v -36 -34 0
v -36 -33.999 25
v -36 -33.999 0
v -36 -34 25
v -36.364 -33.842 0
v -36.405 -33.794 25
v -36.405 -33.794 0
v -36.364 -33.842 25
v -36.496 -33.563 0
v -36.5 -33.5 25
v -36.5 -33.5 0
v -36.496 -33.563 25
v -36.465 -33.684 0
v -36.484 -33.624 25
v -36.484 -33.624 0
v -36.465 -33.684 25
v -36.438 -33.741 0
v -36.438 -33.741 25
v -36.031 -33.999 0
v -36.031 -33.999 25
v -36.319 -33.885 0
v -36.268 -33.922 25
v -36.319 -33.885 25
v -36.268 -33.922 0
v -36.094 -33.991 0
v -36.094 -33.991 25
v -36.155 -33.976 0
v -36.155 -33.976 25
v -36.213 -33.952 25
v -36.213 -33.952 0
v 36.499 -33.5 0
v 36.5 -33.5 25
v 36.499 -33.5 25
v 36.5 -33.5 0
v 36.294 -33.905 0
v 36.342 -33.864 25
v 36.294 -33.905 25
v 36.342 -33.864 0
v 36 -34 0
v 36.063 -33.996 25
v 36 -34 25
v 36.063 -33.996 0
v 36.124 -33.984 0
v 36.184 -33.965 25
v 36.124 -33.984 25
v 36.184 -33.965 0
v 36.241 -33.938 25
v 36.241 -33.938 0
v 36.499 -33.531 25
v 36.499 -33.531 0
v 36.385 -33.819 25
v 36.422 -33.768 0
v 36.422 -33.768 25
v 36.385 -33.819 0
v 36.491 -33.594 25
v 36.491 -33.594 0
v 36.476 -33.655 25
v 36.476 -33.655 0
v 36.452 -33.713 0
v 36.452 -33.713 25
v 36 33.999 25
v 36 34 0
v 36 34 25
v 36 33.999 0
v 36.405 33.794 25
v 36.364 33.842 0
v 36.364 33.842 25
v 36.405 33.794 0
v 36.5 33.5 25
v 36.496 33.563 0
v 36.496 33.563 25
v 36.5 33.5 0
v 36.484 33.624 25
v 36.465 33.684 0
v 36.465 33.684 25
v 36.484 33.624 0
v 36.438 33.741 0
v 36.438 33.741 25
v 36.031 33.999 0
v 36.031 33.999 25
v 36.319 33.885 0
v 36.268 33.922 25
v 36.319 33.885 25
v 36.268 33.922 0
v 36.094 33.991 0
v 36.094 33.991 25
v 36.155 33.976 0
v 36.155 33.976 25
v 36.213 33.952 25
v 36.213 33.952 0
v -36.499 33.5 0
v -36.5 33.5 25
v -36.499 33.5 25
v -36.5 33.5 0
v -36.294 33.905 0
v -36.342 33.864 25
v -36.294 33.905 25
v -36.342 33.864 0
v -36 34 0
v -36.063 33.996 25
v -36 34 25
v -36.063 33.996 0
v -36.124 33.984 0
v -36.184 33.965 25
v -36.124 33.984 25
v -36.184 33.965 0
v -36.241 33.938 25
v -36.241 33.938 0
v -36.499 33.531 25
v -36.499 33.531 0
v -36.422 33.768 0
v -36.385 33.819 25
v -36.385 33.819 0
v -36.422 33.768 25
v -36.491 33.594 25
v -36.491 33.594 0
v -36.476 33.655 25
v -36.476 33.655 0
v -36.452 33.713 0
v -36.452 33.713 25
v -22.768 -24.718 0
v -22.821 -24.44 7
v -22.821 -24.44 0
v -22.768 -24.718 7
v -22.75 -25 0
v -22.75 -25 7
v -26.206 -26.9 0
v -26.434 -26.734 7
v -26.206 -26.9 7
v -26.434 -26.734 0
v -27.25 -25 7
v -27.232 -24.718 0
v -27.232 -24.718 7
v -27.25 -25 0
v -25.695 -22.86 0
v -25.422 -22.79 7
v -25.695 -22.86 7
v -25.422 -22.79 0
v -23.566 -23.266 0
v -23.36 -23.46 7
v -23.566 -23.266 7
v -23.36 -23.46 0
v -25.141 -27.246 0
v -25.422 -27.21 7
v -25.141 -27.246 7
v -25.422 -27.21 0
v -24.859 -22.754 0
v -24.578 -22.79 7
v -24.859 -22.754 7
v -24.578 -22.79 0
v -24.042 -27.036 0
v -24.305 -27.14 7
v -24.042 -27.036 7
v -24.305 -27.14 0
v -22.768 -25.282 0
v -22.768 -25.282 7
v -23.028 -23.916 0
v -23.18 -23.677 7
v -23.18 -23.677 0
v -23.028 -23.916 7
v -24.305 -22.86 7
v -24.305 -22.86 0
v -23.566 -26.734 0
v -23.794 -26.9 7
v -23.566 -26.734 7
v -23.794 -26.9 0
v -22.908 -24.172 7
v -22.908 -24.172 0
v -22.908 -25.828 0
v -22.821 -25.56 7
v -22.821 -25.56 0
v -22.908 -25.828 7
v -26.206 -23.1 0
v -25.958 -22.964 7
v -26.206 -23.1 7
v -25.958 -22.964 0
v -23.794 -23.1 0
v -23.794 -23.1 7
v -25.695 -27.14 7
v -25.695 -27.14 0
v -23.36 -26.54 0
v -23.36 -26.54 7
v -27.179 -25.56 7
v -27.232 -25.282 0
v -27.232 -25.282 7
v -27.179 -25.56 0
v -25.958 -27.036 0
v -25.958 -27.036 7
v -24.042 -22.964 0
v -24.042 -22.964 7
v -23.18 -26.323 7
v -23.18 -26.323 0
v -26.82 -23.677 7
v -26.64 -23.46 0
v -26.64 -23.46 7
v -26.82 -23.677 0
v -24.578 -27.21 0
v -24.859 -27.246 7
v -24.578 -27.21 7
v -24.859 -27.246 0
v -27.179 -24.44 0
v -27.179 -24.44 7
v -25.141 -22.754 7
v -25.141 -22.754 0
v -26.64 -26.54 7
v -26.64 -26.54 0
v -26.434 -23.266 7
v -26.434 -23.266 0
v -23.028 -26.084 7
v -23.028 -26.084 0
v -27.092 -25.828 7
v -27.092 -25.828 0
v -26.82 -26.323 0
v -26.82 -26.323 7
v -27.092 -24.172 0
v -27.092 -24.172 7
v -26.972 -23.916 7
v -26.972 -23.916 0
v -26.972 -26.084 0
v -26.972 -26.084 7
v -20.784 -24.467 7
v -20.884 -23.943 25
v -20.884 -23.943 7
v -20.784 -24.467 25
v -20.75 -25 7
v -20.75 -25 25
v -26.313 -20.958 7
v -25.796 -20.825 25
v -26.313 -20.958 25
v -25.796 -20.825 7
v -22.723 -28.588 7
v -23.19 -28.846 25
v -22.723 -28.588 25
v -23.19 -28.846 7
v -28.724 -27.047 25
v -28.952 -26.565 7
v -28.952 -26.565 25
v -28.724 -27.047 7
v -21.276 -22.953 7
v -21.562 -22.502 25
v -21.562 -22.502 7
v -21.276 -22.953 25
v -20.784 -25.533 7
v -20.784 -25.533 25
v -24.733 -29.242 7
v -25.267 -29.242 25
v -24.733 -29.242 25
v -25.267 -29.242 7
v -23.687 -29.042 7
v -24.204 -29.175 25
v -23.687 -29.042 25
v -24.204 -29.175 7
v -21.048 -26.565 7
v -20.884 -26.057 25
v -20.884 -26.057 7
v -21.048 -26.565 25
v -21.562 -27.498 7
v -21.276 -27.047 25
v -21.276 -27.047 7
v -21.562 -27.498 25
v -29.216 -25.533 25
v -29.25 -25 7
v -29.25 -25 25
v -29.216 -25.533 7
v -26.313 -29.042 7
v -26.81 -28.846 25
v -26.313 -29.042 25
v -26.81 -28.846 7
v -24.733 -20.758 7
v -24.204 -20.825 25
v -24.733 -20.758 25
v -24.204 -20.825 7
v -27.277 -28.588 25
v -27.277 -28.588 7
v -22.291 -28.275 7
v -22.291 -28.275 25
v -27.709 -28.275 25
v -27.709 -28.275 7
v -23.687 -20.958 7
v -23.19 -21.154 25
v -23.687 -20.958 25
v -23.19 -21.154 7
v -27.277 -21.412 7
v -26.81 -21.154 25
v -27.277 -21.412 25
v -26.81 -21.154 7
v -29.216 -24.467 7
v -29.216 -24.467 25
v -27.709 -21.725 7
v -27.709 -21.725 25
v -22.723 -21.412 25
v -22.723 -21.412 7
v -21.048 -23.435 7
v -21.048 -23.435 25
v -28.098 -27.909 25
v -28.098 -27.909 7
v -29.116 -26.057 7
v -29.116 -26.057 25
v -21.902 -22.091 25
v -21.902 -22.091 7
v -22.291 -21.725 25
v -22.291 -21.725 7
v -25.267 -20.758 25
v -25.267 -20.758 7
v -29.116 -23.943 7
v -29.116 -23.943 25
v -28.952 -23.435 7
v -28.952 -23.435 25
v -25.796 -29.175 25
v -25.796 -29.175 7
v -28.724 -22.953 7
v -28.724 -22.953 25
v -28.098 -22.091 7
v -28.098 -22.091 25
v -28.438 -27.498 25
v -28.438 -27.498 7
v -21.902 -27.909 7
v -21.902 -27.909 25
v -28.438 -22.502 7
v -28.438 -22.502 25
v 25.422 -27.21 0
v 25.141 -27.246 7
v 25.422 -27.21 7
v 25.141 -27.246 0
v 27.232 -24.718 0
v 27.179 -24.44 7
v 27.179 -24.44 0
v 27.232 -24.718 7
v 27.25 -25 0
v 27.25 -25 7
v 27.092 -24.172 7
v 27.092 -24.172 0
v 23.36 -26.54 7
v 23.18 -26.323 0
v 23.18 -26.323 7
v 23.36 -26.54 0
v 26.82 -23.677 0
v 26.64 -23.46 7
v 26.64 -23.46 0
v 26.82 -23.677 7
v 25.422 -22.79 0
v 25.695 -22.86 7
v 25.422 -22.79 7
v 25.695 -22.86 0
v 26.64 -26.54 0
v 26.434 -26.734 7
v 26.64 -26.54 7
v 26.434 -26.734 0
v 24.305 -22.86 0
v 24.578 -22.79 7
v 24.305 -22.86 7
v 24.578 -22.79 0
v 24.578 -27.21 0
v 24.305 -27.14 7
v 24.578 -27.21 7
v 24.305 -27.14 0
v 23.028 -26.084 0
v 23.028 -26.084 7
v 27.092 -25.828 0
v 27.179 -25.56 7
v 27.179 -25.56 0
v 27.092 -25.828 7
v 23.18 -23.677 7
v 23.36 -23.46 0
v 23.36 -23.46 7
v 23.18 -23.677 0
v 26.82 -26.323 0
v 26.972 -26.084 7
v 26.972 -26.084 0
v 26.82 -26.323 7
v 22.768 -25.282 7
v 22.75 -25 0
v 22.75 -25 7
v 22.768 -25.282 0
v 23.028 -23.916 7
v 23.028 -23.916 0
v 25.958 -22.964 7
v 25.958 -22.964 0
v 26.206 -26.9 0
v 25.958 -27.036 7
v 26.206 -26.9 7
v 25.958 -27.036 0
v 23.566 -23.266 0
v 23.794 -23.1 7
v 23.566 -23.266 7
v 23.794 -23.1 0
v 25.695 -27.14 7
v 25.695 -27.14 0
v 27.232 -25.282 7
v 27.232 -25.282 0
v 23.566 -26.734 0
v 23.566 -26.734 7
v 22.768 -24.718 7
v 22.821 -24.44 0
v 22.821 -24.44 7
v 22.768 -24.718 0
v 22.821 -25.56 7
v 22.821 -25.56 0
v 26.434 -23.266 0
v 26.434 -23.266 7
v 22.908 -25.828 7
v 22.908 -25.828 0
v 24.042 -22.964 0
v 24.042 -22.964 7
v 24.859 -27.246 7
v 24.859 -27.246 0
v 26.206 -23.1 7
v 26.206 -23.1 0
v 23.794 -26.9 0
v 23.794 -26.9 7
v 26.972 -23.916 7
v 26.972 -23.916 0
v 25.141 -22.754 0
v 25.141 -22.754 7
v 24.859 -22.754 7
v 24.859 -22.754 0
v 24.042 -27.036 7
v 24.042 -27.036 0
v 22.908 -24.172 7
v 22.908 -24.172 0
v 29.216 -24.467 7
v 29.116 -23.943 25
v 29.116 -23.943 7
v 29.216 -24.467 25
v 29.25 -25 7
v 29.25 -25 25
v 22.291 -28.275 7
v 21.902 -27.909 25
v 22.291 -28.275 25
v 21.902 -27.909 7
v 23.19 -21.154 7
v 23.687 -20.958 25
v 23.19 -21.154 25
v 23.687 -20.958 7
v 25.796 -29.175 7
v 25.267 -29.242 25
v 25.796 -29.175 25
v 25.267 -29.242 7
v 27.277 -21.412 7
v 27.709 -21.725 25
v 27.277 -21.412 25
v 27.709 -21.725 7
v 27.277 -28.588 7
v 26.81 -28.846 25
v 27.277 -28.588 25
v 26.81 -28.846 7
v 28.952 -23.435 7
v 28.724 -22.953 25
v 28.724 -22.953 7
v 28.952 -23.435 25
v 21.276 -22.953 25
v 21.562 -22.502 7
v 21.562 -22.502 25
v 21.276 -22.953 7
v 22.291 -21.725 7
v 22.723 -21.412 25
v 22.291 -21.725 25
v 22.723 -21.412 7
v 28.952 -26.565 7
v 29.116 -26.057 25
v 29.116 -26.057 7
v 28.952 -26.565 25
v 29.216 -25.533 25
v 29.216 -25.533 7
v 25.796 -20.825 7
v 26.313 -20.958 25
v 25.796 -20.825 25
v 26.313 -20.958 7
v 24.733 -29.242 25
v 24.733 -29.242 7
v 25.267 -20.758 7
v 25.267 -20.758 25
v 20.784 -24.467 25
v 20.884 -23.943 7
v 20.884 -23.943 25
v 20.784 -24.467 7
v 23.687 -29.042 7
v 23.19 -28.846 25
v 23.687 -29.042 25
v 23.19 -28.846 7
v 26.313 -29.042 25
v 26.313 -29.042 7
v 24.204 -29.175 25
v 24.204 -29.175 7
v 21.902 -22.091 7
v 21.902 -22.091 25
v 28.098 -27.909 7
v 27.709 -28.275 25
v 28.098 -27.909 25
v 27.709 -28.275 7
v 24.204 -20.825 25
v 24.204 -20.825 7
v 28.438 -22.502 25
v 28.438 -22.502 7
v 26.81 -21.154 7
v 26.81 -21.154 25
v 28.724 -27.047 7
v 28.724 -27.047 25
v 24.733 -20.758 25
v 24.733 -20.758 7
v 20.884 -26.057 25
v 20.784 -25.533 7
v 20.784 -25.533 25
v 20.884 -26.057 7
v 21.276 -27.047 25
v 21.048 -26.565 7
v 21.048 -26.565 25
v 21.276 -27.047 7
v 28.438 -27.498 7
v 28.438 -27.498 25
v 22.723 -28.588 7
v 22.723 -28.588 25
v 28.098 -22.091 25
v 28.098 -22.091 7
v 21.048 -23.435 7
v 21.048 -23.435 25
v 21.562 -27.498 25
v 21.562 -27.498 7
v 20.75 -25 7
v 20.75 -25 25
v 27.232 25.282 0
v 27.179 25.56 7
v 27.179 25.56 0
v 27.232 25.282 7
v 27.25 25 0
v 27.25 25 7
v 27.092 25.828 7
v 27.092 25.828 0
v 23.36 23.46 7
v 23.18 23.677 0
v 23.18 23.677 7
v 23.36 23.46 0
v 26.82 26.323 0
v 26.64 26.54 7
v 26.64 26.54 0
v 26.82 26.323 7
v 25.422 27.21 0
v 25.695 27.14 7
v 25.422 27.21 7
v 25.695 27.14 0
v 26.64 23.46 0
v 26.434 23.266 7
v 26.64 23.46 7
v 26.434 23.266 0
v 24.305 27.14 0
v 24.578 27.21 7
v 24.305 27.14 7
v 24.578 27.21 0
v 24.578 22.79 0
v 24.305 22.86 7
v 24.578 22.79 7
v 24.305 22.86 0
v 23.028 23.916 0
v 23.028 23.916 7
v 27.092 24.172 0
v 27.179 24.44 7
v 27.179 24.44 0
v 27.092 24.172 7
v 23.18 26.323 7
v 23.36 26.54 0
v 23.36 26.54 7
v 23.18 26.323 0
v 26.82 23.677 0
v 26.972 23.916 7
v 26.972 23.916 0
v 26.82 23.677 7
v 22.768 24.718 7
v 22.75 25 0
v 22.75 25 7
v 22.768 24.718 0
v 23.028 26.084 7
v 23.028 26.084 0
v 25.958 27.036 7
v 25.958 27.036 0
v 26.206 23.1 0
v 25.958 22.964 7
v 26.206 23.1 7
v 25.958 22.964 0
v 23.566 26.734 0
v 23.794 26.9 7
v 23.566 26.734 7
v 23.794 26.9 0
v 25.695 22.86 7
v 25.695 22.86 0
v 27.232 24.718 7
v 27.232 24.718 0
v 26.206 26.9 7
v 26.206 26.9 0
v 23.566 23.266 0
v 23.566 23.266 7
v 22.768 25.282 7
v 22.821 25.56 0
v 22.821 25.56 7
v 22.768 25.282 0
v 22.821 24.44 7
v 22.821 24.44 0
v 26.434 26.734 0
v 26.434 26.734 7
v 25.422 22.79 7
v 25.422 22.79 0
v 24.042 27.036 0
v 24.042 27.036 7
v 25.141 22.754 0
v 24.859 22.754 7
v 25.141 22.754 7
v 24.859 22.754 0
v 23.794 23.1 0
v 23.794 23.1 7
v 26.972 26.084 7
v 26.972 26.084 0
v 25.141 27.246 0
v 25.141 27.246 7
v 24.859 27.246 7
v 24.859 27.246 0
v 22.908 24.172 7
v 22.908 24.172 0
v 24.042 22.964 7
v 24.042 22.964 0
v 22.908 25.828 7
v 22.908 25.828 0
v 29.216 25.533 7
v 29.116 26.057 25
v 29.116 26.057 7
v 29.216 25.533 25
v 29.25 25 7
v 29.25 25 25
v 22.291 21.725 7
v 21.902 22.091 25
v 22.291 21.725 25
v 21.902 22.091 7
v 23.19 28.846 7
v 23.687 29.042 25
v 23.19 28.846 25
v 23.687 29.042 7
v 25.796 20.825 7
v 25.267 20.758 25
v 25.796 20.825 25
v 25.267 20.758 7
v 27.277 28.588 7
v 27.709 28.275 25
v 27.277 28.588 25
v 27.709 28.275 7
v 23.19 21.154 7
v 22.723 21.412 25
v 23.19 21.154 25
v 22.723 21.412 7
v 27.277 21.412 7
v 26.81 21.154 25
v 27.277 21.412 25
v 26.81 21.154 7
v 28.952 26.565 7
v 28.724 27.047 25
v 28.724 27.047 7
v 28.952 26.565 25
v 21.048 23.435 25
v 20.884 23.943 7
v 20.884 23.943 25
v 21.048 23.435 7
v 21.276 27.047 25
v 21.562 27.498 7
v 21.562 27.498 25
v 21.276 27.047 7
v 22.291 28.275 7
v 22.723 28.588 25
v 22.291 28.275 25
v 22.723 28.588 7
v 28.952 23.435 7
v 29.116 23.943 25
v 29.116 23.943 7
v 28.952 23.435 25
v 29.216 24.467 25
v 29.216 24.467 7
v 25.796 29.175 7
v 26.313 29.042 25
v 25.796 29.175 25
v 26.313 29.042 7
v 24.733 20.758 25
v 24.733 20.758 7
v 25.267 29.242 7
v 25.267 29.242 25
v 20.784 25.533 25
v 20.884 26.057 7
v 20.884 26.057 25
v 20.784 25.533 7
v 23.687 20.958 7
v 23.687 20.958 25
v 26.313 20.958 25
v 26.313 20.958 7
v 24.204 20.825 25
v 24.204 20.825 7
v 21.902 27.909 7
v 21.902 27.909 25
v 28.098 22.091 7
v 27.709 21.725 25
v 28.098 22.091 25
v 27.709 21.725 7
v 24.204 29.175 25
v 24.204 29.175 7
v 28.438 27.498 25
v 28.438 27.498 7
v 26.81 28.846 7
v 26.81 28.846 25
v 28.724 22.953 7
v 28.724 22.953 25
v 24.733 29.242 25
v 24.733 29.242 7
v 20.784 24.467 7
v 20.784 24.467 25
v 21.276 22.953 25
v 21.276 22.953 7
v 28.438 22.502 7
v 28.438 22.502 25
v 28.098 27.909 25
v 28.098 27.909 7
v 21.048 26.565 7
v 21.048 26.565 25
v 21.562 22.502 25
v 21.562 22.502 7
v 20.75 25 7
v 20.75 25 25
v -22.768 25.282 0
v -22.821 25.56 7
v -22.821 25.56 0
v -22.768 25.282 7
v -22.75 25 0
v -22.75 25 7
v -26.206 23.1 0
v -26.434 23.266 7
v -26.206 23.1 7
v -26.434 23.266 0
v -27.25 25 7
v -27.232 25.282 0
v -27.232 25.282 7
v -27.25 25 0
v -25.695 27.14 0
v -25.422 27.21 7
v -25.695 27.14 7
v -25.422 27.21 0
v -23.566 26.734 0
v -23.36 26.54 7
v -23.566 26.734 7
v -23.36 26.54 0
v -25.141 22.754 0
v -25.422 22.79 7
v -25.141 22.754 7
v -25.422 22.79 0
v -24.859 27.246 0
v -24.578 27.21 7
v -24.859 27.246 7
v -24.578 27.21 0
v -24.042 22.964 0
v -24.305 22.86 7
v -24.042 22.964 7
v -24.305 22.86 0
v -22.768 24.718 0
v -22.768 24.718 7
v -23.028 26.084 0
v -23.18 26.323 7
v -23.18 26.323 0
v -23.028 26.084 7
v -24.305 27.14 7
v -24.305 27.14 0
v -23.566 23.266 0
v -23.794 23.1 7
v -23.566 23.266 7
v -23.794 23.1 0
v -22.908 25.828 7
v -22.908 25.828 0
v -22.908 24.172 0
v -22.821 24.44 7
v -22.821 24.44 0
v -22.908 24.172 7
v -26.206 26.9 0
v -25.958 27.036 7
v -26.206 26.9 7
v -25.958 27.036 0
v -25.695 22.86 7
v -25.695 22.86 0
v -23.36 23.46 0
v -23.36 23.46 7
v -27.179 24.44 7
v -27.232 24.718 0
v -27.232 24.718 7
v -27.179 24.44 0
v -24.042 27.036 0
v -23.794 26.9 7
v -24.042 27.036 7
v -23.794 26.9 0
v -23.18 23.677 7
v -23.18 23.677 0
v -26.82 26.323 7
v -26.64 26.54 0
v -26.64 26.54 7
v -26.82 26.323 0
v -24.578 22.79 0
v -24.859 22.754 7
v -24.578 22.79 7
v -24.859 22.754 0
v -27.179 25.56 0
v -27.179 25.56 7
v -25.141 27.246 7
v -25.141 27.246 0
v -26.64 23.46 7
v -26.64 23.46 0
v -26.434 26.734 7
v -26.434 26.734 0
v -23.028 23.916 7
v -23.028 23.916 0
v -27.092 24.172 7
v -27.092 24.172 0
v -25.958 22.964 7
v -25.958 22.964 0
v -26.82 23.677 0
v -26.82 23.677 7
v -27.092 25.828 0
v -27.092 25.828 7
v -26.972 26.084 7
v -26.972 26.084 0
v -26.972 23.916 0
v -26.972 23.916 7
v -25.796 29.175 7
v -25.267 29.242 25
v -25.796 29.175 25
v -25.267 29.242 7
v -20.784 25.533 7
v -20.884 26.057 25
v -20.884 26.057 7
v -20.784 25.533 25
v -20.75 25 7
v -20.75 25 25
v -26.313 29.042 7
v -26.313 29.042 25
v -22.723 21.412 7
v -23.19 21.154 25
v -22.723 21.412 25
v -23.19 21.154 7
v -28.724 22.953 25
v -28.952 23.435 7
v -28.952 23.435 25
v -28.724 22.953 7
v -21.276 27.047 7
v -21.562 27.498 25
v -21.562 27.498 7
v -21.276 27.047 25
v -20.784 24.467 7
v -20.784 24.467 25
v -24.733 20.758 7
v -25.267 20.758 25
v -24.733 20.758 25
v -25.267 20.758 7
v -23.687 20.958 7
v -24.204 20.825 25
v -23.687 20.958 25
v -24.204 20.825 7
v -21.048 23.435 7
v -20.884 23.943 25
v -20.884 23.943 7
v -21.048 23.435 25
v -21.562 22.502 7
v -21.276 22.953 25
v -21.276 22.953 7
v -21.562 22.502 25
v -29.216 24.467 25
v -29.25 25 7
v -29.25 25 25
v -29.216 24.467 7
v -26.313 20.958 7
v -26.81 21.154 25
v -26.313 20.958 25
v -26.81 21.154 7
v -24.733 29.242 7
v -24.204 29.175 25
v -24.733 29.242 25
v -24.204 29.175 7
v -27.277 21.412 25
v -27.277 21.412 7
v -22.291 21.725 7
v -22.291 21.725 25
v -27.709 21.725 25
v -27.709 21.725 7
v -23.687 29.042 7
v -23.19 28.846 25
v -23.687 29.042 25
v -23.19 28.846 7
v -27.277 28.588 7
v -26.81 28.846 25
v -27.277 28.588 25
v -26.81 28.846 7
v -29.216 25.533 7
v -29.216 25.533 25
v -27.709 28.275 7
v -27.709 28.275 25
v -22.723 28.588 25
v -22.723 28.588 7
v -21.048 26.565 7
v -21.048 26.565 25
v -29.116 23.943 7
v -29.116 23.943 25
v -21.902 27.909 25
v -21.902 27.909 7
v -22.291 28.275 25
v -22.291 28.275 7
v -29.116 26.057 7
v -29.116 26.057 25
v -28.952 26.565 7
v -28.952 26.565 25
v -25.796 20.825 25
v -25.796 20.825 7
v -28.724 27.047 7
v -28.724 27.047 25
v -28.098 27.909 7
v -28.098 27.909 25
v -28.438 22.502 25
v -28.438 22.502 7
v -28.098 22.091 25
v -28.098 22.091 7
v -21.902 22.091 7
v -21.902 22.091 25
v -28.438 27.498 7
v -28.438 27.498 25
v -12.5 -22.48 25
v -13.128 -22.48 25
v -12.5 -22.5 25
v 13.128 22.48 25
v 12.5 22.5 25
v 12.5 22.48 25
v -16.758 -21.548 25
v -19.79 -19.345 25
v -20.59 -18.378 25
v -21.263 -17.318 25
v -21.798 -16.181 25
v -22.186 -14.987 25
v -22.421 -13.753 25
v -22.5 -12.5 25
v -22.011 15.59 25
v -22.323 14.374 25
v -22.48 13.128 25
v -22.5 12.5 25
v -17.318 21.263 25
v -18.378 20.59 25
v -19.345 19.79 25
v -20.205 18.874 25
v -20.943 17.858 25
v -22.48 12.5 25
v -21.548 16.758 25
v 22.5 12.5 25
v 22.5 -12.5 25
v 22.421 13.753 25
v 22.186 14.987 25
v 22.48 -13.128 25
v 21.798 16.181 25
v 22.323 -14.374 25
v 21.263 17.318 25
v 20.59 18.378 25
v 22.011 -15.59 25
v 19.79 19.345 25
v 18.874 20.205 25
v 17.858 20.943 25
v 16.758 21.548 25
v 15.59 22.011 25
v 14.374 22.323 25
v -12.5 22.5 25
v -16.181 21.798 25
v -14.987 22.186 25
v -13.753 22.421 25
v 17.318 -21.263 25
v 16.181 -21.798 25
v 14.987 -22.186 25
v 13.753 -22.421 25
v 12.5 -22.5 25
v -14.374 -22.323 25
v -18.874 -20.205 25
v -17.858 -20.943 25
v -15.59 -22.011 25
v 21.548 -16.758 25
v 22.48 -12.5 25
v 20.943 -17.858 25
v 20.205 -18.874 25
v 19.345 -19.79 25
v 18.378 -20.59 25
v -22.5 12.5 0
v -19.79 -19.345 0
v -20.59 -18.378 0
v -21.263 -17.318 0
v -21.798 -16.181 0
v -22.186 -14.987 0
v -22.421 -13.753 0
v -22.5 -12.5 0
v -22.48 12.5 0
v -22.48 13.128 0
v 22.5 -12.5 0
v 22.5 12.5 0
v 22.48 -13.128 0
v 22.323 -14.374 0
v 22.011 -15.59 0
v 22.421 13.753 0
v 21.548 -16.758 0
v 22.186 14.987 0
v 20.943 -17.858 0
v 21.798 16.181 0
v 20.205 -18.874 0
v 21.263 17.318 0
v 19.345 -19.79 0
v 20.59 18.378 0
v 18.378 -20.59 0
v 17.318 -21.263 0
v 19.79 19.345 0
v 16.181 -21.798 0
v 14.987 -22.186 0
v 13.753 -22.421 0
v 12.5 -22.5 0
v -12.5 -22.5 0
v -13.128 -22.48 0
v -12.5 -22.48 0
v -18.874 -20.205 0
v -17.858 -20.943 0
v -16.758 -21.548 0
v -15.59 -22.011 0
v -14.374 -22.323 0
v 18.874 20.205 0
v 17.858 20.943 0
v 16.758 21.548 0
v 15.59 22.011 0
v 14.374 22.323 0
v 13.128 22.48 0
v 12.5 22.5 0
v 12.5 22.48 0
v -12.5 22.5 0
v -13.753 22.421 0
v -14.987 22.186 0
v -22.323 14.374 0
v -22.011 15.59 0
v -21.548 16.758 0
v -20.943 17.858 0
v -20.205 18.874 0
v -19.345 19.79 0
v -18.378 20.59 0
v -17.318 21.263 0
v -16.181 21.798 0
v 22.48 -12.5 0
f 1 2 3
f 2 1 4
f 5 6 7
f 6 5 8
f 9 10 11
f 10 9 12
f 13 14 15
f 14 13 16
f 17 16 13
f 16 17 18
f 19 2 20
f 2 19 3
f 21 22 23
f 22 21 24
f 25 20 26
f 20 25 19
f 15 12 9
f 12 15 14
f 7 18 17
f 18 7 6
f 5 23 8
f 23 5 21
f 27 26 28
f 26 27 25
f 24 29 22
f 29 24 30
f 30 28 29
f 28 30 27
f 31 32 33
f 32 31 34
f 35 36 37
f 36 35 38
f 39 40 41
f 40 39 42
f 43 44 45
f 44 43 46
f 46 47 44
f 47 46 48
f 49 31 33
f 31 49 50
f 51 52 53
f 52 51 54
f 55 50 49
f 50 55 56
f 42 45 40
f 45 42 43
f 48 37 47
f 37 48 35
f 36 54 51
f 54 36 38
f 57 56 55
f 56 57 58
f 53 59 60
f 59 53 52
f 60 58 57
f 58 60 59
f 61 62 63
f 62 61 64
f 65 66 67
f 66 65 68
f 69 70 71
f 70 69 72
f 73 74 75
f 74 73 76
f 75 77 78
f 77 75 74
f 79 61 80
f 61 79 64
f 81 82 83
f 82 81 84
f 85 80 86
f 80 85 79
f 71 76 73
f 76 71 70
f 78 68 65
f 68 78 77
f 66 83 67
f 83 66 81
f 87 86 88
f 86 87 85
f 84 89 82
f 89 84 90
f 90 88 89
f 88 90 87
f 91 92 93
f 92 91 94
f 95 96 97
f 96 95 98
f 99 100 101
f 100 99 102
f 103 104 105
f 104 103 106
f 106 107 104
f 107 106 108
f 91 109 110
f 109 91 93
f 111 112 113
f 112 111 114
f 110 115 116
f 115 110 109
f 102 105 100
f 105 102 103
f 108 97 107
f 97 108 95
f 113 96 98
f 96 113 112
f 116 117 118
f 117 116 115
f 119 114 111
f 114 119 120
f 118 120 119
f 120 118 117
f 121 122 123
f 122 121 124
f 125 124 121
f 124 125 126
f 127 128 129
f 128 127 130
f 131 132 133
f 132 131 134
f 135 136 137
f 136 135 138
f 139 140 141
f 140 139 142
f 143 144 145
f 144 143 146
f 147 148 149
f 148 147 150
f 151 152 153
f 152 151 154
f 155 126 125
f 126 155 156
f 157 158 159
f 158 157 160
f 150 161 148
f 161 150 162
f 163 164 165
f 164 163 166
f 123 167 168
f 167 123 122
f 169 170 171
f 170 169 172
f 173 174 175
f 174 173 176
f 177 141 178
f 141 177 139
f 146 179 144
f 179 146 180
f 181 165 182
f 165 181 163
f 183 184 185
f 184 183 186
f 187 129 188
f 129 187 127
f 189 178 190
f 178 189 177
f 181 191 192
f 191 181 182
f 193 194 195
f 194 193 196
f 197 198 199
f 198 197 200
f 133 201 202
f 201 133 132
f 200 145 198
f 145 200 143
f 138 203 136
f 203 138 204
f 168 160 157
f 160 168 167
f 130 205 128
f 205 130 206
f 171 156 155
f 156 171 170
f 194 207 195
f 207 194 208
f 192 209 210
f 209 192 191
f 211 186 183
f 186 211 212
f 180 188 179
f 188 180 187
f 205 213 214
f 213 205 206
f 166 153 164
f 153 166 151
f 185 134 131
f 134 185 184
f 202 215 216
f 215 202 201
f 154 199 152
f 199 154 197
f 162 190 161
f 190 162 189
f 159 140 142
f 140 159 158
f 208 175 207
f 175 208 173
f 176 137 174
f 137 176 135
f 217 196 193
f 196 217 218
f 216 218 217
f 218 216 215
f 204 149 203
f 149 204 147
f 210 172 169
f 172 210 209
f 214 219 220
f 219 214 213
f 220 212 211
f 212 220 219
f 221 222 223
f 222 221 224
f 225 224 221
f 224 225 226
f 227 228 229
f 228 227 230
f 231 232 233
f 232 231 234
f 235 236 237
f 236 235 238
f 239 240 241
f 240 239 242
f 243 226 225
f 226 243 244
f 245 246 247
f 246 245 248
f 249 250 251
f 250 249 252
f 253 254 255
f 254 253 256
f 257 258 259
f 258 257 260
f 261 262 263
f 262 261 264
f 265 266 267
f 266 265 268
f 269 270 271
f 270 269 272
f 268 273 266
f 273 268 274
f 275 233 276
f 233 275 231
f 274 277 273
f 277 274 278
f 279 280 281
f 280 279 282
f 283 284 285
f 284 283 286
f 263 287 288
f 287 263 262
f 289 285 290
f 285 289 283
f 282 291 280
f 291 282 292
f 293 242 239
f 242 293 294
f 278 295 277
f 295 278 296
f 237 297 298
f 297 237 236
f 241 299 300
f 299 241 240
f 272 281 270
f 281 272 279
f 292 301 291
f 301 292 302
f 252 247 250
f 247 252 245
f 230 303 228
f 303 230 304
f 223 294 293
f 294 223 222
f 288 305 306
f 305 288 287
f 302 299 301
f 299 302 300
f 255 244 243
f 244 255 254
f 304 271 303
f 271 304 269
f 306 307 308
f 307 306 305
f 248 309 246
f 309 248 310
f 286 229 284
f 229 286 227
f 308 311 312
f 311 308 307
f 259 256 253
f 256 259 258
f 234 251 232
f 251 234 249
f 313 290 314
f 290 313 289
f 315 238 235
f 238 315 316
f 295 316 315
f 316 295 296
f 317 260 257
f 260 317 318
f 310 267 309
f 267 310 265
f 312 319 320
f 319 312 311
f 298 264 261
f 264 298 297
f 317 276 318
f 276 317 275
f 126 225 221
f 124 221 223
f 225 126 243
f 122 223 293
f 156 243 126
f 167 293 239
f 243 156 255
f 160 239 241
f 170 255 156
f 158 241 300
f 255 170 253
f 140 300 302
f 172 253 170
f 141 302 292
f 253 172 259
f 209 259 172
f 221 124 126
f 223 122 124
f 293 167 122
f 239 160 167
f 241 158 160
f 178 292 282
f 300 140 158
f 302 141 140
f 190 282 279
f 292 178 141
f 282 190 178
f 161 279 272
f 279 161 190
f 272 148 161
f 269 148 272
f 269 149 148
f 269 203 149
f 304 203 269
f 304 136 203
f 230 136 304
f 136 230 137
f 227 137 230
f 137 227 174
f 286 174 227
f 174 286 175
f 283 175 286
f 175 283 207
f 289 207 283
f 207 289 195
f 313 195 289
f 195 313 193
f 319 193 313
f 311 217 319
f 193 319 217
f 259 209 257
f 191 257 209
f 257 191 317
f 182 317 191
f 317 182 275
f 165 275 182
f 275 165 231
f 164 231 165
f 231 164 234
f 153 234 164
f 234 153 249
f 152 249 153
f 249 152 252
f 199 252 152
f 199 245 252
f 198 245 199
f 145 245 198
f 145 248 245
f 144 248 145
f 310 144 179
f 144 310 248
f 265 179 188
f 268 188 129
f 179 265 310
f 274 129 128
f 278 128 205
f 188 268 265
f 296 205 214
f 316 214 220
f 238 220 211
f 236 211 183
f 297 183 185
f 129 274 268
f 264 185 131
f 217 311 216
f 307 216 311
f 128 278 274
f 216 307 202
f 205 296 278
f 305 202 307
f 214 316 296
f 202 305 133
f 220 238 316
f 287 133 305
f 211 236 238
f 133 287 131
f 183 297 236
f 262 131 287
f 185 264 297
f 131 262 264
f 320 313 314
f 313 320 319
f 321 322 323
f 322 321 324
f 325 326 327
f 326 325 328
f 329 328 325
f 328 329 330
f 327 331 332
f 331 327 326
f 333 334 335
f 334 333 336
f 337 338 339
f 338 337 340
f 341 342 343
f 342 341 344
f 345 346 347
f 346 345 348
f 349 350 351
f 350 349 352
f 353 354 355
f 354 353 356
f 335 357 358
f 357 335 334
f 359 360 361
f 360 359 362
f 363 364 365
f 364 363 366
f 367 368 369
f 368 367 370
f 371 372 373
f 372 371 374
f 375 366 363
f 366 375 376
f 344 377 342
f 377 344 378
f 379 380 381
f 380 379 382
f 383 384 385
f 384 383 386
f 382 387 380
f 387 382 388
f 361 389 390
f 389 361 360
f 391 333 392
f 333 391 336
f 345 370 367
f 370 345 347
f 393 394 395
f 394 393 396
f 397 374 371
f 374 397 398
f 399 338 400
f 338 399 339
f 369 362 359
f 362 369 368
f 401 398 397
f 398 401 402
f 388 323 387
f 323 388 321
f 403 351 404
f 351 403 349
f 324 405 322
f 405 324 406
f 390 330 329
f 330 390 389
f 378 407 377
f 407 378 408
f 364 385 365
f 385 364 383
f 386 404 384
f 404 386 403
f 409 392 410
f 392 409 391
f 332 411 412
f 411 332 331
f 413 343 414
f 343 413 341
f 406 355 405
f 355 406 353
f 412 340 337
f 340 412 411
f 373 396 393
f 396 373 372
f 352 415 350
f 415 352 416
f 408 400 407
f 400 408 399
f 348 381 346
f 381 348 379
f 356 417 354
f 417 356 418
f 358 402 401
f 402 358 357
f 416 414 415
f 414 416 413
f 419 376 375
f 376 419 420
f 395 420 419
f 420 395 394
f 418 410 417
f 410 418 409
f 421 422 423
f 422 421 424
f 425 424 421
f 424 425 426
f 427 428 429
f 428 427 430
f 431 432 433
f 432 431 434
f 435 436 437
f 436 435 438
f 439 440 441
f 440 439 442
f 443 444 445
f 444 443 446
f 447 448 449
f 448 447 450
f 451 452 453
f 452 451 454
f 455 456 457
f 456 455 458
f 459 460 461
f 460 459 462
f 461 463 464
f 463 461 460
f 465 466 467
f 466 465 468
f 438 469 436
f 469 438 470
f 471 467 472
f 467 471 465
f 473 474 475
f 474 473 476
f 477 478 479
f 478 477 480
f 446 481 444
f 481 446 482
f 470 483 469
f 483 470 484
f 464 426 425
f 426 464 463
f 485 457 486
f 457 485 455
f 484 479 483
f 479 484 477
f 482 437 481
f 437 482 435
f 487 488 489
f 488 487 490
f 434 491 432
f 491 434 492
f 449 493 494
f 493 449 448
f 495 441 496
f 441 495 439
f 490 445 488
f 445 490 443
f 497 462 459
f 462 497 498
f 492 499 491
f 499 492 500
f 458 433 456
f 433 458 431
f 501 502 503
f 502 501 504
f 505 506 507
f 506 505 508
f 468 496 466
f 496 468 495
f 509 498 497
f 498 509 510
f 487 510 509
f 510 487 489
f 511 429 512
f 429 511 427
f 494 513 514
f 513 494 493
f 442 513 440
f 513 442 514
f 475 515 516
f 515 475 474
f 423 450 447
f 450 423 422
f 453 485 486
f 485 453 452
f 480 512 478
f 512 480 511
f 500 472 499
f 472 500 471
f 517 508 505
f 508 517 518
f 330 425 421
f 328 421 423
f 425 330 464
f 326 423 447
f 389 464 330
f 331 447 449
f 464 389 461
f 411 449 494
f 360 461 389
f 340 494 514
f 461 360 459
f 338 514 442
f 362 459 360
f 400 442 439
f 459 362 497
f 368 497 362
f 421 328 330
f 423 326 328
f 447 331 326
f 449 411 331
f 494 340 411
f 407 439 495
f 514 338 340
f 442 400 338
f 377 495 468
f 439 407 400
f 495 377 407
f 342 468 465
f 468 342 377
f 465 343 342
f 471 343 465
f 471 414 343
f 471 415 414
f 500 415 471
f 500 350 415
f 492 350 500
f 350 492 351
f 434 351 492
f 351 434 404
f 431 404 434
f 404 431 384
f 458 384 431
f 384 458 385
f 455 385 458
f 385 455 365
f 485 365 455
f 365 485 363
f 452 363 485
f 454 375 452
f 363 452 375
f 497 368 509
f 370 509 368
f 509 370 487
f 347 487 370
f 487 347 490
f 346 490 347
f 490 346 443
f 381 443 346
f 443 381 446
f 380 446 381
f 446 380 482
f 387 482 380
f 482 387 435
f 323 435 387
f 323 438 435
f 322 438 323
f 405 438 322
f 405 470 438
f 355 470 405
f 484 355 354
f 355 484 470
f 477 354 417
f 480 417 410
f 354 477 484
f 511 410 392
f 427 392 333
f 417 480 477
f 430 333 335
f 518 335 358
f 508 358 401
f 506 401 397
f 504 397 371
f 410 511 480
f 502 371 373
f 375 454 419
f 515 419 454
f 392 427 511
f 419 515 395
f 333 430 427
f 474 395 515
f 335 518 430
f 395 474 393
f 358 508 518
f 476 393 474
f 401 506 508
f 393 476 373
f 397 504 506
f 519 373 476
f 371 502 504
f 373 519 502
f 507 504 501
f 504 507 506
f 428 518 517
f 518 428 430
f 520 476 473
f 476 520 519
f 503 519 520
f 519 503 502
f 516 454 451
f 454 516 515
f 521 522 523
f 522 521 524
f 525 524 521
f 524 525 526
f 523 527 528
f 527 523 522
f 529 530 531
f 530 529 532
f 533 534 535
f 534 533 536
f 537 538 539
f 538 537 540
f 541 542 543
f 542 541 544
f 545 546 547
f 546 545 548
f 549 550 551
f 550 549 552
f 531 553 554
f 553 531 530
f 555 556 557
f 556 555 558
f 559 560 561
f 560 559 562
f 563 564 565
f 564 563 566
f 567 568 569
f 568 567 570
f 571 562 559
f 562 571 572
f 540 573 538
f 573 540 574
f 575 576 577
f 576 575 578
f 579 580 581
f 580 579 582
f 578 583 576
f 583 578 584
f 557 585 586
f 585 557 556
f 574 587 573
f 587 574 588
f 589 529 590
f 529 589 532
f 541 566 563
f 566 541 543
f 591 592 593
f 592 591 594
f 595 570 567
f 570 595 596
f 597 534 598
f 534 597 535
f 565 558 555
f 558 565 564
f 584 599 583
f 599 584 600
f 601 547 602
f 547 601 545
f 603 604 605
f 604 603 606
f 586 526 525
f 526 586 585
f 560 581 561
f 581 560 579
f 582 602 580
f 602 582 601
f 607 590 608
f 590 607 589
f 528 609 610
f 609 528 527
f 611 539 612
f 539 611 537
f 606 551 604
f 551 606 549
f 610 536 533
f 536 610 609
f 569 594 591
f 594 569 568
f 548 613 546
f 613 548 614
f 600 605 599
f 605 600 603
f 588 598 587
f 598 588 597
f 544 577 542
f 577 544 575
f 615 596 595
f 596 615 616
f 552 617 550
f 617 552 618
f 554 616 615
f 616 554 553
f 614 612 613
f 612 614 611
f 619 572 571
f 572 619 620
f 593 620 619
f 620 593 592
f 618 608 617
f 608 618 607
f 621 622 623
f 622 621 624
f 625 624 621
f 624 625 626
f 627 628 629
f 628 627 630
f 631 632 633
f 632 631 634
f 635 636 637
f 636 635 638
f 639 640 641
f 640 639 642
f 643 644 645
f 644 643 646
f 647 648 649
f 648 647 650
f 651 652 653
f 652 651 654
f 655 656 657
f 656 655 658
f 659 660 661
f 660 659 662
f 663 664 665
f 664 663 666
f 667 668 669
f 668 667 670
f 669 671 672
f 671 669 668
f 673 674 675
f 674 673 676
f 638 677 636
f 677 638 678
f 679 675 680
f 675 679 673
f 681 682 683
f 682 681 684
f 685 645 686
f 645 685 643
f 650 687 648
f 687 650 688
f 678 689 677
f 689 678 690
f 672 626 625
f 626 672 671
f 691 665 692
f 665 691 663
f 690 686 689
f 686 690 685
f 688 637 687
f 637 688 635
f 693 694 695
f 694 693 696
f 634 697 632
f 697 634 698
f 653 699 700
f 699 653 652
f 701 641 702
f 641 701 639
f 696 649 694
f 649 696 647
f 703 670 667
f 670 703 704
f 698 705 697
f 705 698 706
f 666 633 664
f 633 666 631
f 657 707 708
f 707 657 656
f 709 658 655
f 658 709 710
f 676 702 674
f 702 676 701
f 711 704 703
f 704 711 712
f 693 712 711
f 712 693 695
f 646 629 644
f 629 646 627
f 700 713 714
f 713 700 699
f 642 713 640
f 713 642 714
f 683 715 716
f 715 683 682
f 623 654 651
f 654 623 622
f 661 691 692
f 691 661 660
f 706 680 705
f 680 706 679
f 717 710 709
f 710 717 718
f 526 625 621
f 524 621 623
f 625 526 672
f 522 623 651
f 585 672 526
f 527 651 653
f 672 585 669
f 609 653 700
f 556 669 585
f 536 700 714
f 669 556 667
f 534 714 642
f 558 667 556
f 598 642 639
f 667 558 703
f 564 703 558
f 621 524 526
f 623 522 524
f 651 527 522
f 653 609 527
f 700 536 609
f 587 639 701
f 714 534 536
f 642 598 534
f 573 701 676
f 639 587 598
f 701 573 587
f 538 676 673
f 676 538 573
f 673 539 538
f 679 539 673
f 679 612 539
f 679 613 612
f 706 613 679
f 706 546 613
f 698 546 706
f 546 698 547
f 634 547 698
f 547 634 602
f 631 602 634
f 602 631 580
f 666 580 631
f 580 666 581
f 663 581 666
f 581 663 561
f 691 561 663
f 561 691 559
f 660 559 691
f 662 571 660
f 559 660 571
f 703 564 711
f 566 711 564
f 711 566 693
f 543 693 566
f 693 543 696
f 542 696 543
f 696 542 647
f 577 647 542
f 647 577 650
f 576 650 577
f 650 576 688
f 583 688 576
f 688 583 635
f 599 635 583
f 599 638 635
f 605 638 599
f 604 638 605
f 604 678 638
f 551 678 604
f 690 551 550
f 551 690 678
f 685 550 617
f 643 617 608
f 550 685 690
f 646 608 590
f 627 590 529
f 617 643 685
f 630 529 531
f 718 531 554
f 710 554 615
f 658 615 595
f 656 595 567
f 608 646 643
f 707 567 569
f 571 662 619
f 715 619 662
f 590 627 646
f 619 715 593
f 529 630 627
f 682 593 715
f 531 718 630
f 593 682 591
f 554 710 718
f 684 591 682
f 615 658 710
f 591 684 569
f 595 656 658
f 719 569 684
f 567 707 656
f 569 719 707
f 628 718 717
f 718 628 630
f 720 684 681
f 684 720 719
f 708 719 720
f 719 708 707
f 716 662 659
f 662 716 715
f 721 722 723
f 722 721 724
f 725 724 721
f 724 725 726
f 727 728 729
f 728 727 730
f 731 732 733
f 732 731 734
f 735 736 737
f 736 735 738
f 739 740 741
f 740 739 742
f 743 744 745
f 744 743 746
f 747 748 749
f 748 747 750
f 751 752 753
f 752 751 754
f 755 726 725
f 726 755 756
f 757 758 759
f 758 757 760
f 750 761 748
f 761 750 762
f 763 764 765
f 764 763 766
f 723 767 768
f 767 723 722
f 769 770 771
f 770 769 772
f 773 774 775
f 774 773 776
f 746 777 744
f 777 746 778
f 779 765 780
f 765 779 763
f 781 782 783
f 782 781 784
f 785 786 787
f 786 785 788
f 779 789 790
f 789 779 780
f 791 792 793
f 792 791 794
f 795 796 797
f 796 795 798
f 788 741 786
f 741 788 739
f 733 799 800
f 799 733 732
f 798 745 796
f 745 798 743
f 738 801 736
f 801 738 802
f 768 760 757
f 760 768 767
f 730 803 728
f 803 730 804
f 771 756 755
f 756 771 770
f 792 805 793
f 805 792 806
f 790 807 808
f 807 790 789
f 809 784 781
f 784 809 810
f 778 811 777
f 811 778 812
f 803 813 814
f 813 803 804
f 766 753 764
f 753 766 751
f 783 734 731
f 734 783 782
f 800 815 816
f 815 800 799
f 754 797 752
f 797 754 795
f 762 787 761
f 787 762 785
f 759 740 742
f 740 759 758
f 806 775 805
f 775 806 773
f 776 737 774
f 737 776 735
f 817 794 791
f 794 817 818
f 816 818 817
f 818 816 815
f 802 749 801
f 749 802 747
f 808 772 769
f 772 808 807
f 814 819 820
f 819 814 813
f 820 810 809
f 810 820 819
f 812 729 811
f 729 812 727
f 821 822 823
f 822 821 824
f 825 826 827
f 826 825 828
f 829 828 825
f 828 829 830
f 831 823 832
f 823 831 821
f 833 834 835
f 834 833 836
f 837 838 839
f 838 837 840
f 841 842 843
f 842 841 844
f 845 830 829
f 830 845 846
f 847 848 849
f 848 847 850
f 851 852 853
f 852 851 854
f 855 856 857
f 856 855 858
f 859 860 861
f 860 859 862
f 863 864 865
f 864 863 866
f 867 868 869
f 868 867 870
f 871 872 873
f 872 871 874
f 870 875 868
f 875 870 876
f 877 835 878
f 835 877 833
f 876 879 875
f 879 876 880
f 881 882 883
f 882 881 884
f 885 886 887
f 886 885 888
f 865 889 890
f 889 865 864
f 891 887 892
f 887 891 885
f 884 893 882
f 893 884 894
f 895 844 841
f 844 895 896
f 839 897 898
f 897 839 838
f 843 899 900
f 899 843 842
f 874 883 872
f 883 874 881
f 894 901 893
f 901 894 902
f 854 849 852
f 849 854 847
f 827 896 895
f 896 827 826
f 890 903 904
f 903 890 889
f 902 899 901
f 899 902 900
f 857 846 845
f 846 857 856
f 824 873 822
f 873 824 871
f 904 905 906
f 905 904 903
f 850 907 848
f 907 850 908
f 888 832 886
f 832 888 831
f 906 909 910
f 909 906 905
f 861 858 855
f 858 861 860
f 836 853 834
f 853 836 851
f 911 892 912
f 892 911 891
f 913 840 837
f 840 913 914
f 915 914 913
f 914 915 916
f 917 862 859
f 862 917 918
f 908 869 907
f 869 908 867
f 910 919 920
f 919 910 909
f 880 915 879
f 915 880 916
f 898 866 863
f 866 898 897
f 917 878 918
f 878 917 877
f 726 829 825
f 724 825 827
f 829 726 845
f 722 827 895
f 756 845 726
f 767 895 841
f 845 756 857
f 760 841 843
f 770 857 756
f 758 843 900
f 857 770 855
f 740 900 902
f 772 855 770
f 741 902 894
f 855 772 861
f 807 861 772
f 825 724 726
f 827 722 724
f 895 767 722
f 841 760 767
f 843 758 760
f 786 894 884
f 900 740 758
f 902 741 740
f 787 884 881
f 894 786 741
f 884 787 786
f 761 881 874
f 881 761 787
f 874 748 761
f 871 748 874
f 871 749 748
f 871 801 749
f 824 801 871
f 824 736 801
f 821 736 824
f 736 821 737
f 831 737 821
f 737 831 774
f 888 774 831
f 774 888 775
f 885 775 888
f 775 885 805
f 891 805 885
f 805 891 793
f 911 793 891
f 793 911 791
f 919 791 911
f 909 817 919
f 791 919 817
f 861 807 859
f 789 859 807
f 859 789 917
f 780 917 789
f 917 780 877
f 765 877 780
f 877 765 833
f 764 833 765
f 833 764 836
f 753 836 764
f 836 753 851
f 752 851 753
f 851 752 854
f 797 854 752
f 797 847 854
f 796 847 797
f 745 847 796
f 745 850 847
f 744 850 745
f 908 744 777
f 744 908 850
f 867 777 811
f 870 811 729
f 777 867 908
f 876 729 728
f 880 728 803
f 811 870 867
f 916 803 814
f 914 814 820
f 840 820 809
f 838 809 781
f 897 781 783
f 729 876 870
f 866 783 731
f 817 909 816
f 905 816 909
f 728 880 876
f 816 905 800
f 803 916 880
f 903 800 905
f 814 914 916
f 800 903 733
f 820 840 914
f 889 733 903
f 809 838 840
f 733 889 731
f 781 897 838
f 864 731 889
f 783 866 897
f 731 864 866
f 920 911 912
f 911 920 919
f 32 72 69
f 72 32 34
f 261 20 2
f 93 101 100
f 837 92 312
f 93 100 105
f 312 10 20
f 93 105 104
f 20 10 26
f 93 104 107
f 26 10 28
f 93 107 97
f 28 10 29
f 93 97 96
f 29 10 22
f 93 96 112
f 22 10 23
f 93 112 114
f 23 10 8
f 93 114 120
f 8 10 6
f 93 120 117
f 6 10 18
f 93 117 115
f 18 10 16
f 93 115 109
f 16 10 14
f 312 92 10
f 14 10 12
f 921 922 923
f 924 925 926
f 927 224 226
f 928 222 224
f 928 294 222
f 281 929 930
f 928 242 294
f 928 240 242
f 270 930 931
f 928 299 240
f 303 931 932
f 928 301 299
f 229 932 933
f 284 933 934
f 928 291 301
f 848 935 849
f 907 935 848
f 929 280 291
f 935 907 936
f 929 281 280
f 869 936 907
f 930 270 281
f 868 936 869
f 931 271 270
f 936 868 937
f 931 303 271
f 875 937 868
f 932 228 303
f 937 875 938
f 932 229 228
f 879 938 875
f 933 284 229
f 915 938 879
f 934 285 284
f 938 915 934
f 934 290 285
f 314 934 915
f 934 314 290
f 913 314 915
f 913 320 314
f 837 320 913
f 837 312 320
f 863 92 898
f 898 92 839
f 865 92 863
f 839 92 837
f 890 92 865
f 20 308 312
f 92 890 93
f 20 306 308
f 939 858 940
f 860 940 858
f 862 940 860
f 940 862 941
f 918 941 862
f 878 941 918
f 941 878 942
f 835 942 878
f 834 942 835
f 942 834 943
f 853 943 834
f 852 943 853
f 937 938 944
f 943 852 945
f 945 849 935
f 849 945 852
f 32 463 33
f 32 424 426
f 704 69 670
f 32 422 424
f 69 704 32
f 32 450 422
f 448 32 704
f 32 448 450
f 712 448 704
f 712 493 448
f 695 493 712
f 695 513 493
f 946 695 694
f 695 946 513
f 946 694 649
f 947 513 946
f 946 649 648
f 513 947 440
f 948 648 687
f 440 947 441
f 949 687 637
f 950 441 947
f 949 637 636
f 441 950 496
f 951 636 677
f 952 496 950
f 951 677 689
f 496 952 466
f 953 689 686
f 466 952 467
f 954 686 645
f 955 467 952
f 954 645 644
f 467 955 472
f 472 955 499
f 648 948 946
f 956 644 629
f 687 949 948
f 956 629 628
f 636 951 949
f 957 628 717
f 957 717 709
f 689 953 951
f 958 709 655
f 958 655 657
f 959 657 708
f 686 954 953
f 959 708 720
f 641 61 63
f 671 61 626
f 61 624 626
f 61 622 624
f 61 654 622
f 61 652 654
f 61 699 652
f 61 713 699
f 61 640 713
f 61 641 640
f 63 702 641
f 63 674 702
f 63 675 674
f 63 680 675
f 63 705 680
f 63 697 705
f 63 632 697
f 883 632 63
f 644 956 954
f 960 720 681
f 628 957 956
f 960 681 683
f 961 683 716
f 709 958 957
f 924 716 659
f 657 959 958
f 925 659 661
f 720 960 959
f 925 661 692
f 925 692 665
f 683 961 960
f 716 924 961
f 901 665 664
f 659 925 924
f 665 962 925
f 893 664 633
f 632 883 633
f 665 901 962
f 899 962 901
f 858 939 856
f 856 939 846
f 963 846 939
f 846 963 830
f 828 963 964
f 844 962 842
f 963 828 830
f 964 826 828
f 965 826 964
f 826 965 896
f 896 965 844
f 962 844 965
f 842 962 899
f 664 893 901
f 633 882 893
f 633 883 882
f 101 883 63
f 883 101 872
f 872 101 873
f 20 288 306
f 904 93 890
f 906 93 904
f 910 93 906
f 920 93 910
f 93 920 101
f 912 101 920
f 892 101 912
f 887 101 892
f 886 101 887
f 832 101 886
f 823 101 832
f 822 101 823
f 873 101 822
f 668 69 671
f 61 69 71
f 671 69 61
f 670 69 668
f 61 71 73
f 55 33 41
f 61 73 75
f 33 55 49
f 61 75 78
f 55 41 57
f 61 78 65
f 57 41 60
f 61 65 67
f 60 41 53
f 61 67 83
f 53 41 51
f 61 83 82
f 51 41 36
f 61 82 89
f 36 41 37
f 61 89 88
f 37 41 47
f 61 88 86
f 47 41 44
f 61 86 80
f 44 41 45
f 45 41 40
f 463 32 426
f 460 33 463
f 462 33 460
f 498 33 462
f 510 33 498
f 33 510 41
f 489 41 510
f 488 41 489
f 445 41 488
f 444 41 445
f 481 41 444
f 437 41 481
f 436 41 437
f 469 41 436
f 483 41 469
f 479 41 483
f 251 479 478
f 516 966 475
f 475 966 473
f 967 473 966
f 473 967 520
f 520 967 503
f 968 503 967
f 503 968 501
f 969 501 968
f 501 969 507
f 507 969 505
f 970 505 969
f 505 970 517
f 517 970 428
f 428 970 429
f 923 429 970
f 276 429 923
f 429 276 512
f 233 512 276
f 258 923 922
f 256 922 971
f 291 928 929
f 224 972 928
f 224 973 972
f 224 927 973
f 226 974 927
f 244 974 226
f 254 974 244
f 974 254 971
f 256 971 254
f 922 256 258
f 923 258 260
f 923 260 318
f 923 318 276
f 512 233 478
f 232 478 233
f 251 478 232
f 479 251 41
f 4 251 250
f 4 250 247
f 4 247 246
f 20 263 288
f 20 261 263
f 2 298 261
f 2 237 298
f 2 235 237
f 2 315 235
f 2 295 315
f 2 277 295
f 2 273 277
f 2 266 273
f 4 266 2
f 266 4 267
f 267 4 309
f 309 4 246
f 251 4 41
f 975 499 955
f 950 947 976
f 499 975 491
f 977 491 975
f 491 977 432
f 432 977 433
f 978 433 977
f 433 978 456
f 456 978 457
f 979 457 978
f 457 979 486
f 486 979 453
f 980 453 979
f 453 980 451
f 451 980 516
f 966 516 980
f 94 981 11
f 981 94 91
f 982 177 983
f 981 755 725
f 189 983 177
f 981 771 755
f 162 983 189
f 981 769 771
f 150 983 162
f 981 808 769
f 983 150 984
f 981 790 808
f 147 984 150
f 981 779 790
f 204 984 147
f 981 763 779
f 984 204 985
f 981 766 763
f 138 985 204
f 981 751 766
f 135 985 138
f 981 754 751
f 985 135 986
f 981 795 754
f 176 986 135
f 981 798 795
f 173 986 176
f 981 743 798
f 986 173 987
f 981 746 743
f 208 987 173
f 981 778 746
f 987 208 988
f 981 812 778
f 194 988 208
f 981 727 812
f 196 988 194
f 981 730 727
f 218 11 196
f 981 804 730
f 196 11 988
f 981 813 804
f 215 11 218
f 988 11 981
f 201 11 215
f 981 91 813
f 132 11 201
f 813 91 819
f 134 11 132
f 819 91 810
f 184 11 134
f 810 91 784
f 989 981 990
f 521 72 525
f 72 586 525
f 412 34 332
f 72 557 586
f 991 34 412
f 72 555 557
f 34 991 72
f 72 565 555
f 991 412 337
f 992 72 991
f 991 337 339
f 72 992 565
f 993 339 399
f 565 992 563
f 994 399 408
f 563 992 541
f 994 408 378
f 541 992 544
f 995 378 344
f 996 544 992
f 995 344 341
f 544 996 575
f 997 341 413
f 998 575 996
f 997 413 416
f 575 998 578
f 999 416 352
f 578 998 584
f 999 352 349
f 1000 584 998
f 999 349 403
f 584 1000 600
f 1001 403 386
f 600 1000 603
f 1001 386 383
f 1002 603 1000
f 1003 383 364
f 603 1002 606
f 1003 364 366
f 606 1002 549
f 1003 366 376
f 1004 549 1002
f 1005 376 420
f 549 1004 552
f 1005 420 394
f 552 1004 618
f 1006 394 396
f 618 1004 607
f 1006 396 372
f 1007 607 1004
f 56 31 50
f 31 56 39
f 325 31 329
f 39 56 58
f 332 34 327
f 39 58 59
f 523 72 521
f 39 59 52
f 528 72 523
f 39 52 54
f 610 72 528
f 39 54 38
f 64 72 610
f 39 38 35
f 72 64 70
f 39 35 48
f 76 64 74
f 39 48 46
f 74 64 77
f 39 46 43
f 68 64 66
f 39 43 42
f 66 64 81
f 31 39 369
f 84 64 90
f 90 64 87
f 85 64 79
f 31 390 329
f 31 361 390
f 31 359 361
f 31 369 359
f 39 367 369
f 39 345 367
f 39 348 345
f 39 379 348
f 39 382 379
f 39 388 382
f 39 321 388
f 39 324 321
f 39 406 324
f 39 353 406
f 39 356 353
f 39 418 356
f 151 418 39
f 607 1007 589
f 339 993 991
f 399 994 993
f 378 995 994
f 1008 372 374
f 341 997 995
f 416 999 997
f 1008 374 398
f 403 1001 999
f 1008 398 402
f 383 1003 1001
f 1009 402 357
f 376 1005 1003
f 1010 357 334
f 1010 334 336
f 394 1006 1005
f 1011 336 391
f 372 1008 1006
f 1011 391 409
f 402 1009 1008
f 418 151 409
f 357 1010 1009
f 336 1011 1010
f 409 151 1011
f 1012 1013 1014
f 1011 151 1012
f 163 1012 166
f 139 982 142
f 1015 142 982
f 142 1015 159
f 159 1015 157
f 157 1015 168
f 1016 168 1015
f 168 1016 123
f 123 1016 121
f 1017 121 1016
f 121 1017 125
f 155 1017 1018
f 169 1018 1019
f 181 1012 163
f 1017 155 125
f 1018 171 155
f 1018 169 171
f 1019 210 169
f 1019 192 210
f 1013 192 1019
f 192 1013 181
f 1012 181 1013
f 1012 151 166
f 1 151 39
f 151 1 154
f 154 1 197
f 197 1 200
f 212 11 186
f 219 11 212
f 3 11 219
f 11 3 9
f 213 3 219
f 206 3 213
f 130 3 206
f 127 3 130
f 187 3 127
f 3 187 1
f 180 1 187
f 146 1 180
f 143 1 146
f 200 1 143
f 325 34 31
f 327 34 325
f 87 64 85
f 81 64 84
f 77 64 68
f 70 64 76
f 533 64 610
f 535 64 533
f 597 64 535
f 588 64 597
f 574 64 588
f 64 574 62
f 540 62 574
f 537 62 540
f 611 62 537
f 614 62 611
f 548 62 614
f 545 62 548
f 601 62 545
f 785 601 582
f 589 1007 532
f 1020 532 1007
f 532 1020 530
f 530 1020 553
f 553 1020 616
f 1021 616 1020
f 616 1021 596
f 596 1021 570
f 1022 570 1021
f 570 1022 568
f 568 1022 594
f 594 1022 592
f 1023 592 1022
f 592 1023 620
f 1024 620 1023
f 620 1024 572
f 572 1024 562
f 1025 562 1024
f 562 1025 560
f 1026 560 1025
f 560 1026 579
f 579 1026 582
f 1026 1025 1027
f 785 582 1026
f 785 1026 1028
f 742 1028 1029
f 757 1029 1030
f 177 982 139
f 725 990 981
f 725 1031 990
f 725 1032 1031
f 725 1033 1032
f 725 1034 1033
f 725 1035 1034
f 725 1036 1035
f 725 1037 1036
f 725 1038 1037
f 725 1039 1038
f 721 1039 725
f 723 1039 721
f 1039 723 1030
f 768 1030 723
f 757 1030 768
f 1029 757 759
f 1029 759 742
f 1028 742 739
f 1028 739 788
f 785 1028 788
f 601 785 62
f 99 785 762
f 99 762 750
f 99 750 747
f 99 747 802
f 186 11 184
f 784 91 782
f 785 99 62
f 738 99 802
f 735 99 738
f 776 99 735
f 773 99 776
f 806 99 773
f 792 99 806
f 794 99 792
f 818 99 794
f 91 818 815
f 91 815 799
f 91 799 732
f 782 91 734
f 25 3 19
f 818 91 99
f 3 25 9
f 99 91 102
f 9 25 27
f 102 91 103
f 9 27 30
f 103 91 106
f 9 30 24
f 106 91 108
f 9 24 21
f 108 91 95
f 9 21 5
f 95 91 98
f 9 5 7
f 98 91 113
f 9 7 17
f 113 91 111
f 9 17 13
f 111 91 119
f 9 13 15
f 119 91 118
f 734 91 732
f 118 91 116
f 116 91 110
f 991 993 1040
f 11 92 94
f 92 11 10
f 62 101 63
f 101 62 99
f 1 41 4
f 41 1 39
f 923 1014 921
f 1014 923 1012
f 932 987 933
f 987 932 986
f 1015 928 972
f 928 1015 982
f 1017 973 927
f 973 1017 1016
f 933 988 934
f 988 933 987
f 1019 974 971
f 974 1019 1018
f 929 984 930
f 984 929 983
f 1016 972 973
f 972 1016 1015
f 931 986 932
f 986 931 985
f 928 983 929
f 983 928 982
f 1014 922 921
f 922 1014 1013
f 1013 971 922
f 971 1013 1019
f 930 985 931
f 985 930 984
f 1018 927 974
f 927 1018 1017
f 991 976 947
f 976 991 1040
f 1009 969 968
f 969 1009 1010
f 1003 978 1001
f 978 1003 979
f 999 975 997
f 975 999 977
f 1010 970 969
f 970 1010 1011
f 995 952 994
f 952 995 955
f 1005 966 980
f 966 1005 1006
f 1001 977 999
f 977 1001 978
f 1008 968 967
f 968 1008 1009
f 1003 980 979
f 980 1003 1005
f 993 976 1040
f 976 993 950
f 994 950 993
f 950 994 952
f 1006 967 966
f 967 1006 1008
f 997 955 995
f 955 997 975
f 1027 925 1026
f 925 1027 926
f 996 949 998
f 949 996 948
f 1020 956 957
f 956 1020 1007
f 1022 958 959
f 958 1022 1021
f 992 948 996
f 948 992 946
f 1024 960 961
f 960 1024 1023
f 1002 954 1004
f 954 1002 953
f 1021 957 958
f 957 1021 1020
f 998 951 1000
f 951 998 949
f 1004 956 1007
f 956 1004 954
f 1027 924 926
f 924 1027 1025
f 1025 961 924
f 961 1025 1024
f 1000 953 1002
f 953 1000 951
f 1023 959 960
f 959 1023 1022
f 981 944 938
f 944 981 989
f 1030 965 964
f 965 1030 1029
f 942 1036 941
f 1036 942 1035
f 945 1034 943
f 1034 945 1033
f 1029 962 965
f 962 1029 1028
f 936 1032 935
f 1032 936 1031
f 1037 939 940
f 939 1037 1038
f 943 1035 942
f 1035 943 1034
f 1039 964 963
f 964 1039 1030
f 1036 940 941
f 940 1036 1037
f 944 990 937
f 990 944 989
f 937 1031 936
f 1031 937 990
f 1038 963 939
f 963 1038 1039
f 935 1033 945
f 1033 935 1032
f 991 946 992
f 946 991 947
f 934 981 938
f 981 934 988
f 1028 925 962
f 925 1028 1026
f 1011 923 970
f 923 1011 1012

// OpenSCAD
outerheight = 25;
resolution = 50;

module LK_BOX () {
	difference() {
		translate([-45/2,-45/2,-1]) cube([45,45,outerheight+2]);

		rotate([0,0,0]) translate([-45/2+10,-45/2+10,0]) difference() {
			translate([-20,-20,-2]) cube([20,20,outerheight+4]);
			translate([-0,-0,-2]) cylinder(outerheight+4, 10, 10, $fn=resolution);
		}
		rotate([0,0,90]) translate([-45/2+10,-45/2+10,0]) difference() {
			translate([-20,-20,-2]) cube([20,20,outerheight+4]);
			translate([-0,-0,-2]) cylinder(outerheight+4, 10, 10, $fn=resolution);
		}
		rotate([0,0,180]) translate([-45/2+10,-45/2+10,0]) difference() {
			translate([-20,-20,-2]) cube([20,20,outerheight+4]);
			translate([-0,-0,-2]) cylinder(outerheight+4, 10, 10, $fn=resolution);
		}
		rotate([0,0,270]) translate([-45/2+10,-45/2+10,0]) difference() {
			translate([-20,-20,-2]) cube([20,20,outerheight+4]);
			translate([-0,-0,-2]) cylinder(outerheight+4, 10, 10, $fn=resolution);
		}

	} 
}

module C_BOX () {
	difference() {
		translate([-73/2,-68/2,0]) cube([73,68,outerheight]);

		rotate([0,0,0]) translate([-73/2+0.5,-68/2+0.5,0]) difference() {
			translate([-1,-1,-2]) cube([1,1,outerheight+4]);
			translate([-0,-0,-2]) cylinder(outerheight+4, 0.5, 0.5, $fn=resolution);
		}
		rotate([0,0,90]) translate([-68/2+0.5,-73/2+0.5,0]) difference() {
			translate([-1,-1,-2]) cube([1,1,outerheight+4]);
			translate([-0,-0,-2]) cylinder(outerheight+4, 0.5, 0.5, $fn=resolution);
		}
		rotate([0,0,180]) translate([-73/2+0.5,-68/2+0.5,0]) difference() {
			translate([-1,-1,-2]) cube([1,1,outerheight+4]);
			translate([-0,-0,-2]) cylinder(outerheight+4, 0.5, 0.5, $fn=resolution);
		}
		rotate([0,0,270]) translate([-68/2+0.5,-73/2+0.5,0]) difference() {
			translate([-1,-1,-2]) cube([1,1,outerheight+4]);
			translate([-0,-0,-2]) cylinder(outerheight+4, 0.5, 0.5, $fn=resolution);
		}
		union() {		
			translate([-25,-25,-1]) cylinder(outerheight+2, 2.25, 2.25, $fn=resolution);
			translate([-25,-25,7]) cylinder(outerheight, 4.25, 4.25, $fn=resolution);
			translate([25,-25,-1]) cylinder(outerheight+2, 2.25, 2.25, $fn=resolution);
			translate([25,-25,7]) cylinder(outerheight, 4.25, 4.25, $fn=resolution);
			translate([25,25,-1]) cylinder(outerheight+2, 2.25, 2.25, $fn=resolution);
			translate([25,25,7]) cylinder(outerheight, 4.25, 4.25, $fn=resolution);
			translate([-25,25,-1]) cylinder(outerheight+2, 2.25, 2.25, $fn=resolution);
			translate([-25,25,7]) cylinder(outerheight, 4.25, 4.25, $fn=resolution);
		}
	}
}

difference() {
	C_BOX();
	LK_BOX();
}
